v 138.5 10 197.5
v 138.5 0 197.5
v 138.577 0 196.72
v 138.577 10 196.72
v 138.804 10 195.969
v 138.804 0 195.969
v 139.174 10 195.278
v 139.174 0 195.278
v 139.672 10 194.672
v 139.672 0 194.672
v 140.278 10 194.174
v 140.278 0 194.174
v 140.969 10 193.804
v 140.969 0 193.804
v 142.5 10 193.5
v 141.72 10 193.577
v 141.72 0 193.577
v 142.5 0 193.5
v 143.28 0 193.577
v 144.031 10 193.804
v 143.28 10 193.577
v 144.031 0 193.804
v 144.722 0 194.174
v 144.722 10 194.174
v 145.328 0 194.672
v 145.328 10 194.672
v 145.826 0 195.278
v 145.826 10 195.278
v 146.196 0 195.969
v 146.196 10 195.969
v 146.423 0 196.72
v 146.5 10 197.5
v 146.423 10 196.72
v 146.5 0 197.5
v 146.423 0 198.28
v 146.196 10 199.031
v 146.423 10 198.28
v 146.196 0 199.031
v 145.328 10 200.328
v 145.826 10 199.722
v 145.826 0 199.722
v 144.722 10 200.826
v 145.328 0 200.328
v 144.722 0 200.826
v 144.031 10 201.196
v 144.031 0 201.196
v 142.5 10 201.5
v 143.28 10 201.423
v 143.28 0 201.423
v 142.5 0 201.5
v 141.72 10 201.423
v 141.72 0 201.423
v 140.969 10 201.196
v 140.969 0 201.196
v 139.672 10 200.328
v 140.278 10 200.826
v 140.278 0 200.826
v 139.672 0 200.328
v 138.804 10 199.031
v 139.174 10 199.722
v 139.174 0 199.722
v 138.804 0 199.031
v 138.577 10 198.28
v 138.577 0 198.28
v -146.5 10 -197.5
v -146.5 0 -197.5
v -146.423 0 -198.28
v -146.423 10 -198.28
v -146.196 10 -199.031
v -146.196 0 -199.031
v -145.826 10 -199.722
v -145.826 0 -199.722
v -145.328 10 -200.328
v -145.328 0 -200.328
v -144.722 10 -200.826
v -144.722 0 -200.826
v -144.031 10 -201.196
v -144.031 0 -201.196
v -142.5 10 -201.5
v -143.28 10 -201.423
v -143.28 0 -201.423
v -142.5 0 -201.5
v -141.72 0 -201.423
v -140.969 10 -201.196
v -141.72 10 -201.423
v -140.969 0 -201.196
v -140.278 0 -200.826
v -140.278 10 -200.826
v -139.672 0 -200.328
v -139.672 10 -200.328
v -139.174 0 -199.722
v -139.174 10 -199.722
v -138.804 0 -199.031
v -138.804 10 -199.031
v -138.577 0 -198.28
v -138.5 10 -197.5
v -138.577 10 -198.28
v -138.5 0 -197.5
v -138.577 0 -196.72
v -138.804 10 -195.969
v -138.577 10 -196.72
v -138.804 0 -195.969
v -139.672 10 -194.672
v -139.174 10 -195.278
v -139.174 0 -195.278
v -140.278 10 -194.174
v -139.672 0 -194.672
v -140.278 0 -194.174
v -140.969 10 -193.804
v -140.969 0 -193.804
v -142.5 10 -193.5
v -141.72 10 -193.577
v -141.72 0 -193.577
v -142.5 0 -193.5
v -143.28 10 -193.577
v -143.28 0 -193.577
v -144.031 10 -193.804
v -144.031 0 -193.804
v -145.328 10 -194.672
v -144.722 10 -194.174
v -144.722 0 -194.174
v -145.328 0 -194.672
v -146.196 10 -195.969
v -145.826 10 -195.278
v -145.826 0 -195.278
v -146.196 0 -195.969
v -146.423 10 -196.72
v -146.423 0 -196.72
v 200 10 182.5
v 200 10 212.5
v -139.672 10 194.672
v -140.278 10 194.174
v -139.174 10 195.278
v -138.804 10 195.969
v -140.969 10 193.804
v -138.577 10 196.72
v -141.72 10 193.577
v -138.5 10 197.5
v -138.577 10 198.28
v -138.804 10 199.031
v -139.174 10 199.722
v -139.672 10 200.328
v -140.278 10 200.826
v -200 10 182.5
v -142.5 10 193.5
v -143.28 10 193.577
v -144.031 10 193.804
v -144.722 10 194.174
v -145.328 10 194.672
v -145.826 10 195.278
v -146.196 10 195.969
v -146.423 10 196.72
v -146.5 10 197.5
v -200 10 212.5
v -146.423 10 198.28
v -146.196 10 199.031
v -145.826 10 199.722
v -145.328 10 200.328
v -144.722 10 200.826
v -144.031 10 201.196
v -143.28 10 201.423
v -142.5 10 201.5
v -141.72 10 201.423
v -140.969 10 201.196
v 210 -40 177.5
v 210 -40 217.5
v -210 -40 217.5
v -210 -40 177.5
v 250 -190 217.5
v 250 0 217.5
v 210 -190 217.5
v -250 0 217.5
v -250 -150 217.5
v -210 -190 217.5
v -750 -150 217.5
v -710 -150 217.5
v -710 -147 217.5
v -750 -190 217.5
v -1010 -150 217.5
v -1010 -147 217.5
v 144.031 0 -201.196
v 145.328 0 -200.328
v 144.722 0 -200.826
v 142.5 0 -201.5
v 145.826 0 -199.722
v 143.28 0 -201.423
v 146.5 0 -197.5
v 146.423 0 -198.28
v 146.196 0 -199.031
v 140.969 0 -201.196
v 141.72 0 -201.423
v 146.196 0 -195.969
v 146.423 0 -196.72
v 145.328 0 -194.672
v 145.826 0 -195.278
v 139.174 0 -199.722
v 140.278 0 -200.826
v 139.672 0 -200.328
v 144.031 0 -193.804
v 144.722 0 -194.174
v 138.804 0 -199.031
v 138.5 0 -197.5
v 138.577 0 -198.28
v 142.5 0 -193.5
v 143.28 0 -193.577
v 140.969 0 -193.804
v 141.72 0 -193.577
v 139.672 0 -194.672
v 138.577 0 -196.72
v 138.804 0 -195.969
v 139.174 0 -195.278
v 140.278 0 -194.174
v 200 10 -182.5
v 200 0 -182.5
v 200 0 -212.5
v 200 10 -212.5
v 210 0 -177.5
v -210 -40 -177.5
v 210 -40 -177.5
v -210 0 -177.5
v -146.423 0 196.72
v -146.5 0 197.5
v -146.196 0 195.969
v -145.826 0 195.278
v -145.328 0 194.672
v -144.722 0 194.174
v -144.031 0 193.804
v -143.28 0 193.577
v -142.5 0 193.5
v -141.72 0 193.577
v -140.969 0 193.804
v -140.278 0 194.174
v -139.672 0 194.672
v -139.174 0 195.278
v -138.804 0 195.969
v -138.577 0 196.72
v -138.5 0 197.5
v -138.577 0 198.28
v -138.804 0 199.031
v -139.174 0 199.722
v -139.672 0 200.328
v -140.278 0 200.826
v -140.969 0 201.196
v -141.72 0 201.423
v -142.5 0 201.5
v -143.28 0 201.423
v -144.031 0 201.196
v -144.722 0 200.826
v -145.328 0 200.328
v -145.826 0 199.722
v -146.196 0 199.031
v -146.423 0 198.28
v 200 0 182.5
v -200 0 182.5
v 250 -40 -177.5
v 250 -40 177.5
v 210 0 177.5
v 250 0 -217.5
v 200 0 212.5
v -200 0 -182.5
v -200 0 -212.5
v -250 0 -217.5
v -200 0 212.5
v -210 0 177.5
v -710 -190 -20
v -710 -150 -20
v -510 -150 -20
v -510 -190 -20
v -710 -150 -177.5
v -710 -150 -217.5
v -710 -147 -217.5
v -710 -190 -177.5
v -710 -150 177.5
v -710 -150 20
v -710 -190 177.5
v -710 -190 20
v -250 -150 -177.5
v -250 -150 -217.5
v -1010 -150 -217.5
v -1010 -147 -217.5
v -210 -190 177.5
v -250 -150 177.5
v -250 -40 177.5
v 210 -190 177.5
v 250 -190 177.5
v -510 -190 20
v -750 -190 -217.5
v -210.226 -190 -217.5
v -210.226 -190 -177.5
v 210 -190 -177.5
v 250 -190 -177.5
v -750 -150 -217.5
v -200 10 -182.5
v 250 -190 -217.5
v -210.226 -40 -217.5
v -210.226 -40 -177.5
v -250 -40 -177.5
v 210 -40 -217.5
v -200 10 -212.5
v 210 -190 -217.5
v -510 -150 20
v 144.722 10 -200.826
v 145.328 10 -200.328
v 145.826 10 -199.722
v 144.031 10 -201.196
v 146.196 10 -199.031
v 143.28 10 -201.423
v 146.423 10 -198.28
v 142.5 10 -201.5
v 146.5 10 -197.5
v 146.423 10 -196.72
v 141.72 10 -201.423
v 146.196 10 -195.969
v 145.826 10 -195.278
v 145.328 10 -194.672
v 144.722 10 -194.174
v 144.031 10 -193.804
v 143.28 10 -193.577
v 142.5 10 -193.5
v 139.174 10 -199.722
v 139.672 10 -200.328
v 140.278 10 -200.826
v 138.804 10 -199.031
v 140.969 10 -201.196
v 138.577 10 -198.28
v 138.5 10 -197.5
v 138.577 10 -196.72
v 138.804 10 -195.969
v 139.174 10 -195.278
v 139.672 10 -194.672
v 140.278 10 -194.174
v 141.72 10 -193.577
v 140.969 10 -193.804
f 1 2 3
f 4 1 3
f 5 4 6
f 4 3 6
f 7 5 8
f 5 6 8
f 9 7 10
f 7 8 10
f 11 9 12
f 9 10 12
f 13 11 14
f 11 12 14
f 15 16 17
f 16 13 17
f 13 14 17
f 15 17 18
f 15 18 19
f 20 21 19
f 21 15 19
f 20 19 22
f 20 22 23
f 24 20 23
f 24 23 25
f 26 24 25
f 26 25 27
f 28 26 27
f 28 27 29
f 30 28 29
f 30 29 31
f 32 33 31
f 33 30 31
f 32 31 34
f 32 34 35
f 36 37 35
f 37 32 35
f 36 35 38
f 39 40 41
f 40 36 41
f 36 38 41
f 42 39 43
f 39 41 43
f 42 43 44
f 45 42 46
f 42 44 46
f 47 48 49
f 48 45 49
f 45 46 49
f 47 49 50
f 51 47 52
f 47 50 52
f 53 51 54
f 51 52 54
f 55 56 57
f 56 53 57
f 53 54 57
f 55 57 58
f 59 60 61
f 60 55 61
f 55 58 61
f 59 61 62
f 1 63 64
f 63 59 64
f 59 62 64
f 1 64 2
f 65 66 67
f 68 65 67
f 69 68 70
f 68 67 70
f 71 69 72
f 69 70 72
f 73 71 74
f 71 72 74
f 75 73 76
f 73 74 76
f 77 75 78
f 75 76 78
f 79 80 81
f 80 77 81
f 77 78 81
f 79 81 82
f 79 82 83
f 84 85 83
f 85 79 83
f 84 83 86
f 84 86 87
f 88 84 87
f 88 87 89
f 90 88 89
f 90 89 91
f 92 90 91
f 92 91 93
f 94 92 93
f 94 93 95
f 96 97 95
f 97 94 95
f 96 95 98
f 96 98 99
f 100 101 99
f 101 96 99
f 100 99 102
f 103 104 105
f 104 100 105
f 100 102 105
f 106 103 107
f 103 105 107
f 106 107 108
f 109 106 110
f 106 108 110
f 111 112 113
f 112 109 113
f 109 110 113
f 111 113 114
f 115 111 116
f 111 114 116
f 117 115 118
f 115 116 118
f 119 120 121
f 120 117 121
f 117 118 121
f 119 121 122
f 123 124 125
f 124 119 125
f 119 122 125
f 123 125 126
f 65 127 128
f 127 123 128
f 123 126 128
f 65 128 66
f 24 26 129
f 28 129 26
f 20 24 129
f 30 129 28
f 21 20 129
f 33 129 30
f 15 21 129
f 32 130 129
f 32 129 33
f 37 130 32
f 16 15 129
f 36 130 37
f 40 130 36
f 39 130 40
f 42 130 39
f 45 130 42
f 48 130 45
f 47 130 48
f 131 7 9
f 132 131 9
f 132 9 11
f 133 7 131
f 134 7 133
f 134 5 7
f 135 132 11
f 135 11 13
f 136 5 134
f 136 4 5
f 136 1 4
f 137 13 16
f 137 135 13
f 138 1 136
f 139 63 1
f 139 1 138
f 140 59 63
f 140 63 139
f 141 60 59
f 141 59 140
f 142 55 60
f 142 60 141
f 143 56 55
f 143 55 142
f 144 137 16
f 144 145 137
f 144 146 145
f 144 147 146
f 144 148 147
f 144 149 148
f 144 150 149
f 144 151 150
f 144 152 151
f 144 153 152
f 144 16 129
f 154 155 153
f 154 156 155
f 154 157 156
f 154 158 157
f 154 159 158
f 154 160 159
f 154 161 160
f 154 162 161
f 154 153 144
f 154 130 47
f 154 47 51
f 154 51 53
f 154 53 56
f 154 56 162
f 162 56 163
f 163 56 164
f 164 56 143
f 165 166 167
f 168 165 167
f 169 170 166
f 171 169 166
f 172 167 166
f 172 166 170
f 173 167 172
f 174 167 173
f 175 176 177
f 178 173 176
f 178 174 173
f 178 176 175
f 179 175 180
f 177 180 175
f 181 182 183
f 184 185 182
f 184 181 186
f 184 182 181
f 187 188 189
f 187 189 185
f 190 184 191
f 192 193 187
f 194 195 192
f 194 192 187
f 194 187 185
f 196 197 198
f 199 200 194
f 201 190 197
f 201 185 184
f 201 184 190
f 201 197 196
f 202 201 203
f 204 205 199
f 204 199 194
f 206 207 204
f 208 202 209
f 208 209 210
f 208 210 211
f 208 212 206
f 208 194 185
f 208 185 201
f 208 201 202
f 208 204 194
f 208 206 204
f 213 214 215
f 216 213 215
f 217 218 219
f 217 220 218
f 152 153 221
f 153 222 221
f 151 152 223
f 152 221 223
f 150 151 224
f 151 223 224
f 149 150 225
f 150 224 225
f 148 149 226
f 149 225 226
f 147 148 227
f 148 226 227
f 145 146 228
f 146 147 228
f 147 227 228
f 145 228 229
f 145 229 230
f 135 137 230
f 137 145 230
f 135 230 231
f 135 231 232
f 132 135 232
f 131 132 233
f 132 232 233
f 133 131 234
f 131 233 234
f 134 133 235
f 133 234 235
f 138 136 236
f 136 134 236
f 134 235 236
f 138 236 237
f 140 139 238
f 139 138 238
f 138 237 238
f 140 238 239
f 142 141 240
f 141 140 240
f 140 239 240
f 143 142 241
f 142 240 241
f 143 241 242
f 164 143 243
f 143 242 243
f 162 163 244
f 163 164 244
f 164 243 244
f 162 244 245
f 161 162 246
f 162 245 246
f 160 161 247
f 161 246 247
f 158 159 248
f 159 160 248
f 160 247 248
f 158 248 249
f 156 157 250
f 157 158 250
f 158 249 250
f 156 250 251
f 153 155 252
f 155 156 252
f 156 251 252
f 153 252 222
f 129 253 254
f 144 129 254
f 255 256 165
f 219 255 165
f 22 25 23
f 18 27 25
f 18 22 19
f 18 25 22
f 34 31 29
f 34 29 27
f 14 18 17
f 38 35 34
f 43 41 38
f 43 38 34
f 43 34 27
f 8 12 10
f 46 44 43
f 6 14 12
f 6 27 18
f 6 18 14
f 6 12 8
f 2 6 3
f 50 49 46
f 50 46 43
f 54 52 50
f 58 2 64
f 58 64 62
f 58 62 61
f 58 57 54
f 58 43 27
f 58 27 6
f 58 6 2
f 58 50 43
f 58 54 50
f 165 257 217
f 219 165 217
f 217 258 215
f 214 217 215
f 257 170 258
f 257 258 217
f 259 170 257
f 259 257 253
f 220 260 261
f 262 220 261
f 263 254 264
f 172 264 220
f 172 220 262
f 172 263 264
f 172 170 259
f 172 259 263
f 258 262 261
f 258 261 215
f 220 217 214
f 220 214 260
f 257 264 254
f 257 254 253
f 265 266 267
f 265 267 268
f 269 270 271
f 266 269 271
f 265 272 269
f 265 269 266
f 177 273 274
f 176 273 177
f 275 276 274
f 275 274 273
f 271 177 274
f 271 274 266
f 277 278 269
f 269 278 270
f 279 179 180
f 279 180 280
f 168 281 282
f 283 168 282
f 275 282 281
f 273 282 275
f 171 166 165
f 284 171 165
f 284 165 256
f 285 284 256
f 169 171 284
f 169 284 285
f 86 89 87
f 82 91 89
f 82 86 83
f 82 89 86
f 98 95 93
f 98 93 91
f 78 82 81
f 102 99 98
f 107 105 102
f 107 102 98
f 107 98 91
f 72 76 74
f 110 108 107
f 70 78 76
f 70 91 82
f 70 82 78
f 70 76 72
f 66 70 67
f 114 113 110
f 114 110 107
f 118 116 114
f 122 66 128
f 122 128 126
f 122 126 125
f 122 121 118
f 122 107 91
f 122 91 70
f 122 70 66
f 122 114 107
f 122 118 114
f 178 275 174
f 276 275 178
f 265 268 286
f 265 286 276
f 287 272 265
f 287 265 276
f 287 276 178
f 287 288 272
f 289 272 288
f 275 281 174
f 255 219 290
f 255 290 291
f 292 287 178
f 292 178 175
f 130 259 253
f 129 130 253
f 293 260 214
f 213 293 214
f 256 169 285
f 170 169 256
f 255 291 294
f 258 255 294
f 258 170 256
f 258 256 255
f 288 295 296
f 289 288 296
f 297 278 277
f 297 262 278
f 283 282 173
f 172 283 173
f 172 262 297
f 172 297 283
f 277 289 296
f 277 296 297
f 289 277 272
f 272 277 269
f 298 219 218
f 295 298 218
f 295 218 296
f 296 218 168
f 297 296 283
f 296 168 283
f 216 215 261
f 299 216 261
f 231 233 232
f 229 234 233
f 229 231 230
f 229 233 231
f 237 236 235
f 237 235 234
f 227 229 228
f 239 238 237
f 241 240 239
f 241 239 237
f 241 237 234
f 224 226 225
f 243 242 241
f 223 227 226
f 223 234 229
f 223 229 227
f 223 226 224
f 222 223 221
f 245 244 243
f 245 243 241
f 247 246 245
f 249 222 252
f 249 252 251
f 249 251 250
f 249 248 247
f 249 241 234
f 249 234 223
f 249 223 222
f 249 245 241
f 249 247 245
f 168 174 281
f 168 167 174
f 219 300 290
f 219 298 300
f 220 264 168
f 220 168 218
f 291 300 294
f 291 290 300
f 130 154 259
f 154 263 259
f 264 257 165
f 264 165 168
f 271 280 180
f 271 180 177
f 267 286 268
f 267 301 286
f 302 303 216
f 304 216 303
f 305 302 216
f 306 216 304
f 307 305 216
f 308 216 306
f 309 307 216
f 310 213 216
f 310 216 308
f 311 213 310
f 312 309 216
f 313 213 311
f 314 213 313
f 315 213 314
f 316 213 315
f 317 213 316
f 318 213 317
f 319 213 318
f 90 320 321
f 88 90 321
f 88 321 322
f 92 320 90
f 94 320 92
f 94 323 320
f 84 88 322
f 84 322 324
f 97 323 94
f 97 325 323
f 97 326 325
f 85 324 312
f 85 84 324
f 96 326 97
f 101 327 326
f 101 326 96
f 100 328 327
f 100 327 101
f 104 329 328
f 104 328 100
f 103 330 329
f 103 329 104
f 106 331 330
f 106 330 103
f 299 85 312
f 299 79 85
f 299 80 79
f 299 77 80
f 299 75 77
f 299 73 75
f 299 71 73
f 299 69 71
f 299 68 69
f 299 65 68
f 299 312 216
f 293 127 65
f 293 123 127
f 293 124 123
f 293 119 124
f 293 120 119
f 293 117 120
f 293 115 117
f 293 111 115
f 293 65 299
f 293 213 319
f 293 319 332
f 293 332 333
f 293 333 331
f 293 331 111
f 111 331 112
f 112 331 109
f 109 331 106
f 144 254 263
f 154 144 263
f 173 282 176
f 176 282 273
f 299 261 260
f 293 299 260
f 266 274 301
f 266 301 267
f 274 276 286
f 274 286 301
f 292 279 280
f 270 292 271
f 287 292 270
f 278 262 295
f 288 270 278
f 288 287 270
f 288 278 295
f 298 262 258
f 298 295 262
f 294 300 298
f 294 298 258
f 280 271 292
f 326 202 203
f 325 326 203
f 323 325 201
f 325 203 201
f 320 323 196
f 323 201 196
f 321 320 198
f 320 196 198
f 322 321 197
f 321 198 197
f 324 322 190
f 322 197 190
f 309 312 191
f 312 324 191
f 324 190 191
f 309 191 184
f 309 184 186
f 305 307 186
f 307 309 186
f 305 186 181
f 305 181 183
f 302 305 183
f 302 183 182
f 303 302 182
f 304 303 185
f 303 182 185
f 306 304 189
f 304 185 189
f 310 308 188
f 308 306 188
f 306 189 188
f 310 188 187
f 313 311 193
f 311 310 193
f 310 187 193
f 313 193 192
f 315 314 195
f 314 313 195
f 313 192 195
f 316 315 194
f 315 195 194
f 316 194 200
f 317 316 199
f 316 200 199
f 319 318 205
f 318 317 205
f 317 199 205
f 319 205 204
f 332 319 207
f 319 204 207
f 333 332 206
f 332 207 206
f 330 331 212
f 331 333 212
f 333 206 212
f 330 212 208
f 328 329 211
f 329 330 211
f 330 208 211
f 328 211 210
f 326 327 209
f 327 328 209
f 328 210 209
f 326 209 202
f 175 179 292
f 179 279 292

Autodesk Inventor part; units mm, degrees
ref_plane "YZ Plane" through (0, 0, 0) normal (1, 0, 0) x (0, 1, 0)
ref_plane "XZ Plane" through (0, 0, 0) normal (0, 1, 0) x (-1, 0, 0)
ref_plane "XY Plane" through (0, 0, 0) normal (0, 0, 1) x (1, 0, 0)
sketch "Sketch1" plane through (0, 0, 0) normal (0, 1, 0) x (-1, 0, 0)
  line L0 (142.5, 197.5) -> (-142.5, 197.5) construction
  line L1 (-142.5, 197.5) -> (-142.5, -197.5) construction
  line L2 (-142.5, -197.5) -> (142.5, -197.5) construction
  line L3 (142.5, -197.5) -> (142.5, 197.5) construction
  line L4 (142.5, 197.5) -> (-142.5, -197.5) construction
  line L5 (-142.5, 197.5) -> (142.5, -197.5) construction
  line L6 (275, -235) -> (-275, -235) construction
  line L7 (-275, -235) -> (-275, 235) construction
  line L8 (-275, 235) -> (275, 235) construction
  line L9 (275, 235) -> (275, -235) construction
  line L10 (275, -235) -> (-275, 235) construction
  line L11 (-275, -235) -> (275, 235) construction
  line L12 (274.0052, -241.4689) -> (274.0052, -478.1407) construction
  line L13 (274.0052, -478.1407) -> (222.5538, -478.1407) construction
  line L14 (222.5538, -478.1407) -> (222.5538, -241.4689) construction
  line L15 (222.5538, -241.4689) -> (274.0052, -241.4689) construction
  line L16 (200, 212.5) -> (-200, 212.5)
  line L17 (-200, 212.5) -> (-200, 182.5)
  line L18 (-200, 182.5) -> (200, 182.5)
  line L19 (200, 182.5) -> (200, 212.5)
  line L20 (200, 212.5) -> (-200, 182.5) construction
  line L21 (-200, 212.5) -> (200, 182.5) construction
  line L22 (200, -182.5) -> (-200, -182.5)
  line L23 (-200, -182.5) -> (-200, -212.5)
  line L24 (-200, -212.5) -> (200, -212.5)
  line L25 (200, -212.5) -> (200, -182.5)
  line L26 (200, -182.5) -> (-200, -212.5) construction
  line L27 (-200, -182.5) -> (200, -212.5) construction
  circle A0 centre (142.5, 197.5) radius 4
  circle A1 centre (142.5, -197.5) radius 4
  circle A2 centre (-142.5, 197.5) radius 4
  circle A3 centre (-142.5, -197.5) radius 4
  point P0 (0, 0)
  point P1 (0, 197.5)
  point P2 (0, -197.5)
  dimension "d0" = 285
  dimension "d1" = 395
  dimension "d2" = 550
  dimension "d3" = 470
  dimension "d10" = 400
  dimension "d11" = 30
  dimension "d12" = 400
  dimension "d13" = 30
  dimension "d14" = 8
  dimension "d15" = 8
  dimension "d16" = 8
  dimension "d17" = 8
sketch "Sketch2" plane through (0, 0, 0) normal (0, 1, 0) x (-1, 0, 0)
  line L0 (142.5, 197.5) -> (-142.5, 197.5) construction
  line L1 (142.5, -197.5) -> (142.5, 197.5) construction
  line L2 (-142.5, -197.5) -> (142.5, -197.5) construction
  line L3 (-142.5, 197.5) -> (-142.5, -197.5) construction
  line L4 (250, 217.5) -> (-250, 217.5)
  line L5 (-250, 217.5) -> (-250, 177.5)
  line L6 (-250, 177.5) -> (250, 177.5)
  line L7 (250, 177.5) -> (250, 217.5)
  line L8 (250, 217.5) -> (-250, 177.5) construction
  line L9 (-250, 217.5) -> (250, 177.5) construction
  line L10 (250, -177.5) -> (-250, -177.5)
  line L11 (-250, -177.5) -> (-250, -217.5)
  line L12 (-250, -217.5) -> (250, -217.5)
  line L13 (250, -217.5) -> (250, -177.5)
  line L14 (250, -177.5) -> (-250, -217.5) construction
  line L15 (-250, -177.5) -> (250, -217.5) construction
  line L16 (250, 217.5) -> (210, 217.5)
  line L17 (210, 217.5) -> (210, -217.5)
  line L18 (210, -217.5) -> (250, -217.5)
  line L19 (250, -217.5) -> (250, 217.5)
  line L20 (-250, 217.5) -> (-210, 217.5)
  line L21 (-210, 217.5) -> (-210, -217.5)
  line L22 (-210, -217.5) -> (-250, -217.5)
  line L23 (-250, -217.5) -> (-250, 217.5)
  point P0 (0, 0)
  point P1 (0, 197.5)
  point P2 (0, -197.5)
  point P3 (210, -177.5)
  point P4 (-210, -177.5)
  point P5 (-210, 177.5)
  point P6 (210, 177.5)
  dimension "d4" = 500
  dimension "d5" = 40
  dimension "d6" = 500
  dimension "d7" = 40
  dimension "d8" = 40
  dimension "d9" = 40
extrude "Extrusion1" add sketch "Sketch2" against normal blind 40 contours L7 L6 L17 L4 | L17 L6 L21 L4 | L19 L10 L17 L6 | L21 L6 L5 L4 | L13 L12 L17 L10 | L21 L10 L23 L6 | L17 L12 L21 L10 | L21 L12 L11 L10
extrude "Extrusion2" add sketch "Sketch1" along normal blind 10
sketch "Sketch3" plane through (0, -40, 0) normal (0, -1, 0) x (1, 0, 0)
  line L0 (250, -217.5) -> (250, 217.5) construction
  line L1 (250, 217.5) -> (-250, 217.5) construction
  line L2 (-250, -217.5) -> (250, -217.5) construction
  line L3 (-250, 217.5) -> (-250, -217.5) construction
  line L4 (250, 217.5) -> (250, -217.5) projected
  line L5 (210, 177.5) -> (210, -177.5) projected
  line L6 (250, 217.5) -> (210, 217.5)
  line L7 (210, 217.5) -> (210, 177.5)
  line L8 (210, 177.5) -> (250, 177.5)
  line L9 (250, 177.5) -> (250, 217.5)
  line L10 (250, -217.5) -> (-250, -217.5) projected
  line L11 (210, -177.5) -> (250, -177.5)
  line L12 (250, -177.5) -> (250, -217.5)
  line L13 (250, -217.5) -> (210, -217.5)
  line L14 (210, -217.5) -> (210, -177.5)
  line L15 (-250, -217.5) -> (-210.2265, -217.5)
  line L16 (-210.2265, -217.5) -> (-210.2265, -177.5)
  line L17 (-210.2265, -177.5) -> (-250, -177.5)
  line L18 (-250, -177.5) -> (-250, -217.5)
  line L19 (-210, 177.5) -> (-210, -177.5) projected
  line L20 (-250, -217.5) -> (-250, 217.5) projected
  line L21 (-210, 177.5) -> (-250, 177.5)
  line L22 (-250, 177.5) -> (-250, 217.5)
  line L23 (-250, 217.5) -> (-210, 217.5)
  line L24 (-210, 217.5) -> (-210, 177.5)
  point P0 (0, 0)
extrude "Extrusion3" add sketch "Sketch3" along normal blind 150 contours L20 L23 L24 L21 | L10 L18 L17 L16 | L4 L8 L7 L6 | L4 L10 L14 L11
sketch "Sketch4" plane through (-250, 0, -217.5) normal (-1, 0, 0) x (0, 0, 1)
  line L0 (0, 0) -> (435, 0) construction
  line L1 (0, 0) -> (0, -190) construction
  line L2 (40, -190) -> (0, -190) construction
  line L3 (40, -40) -> (40, -190) construction
  line L4 (395, -40) -> (40, -40) construction
  line L5 (395, -40) -> (395, -190) construction
  line L6 (435, -190) -> (395, -190) construction
  line L7 (435, 0) -> (435, -190) construction
  line L8 (0, -40) -> (0, -190) projected
  line L9 (40, -40) -> (40, -190) projected
  line L10 (0, -190) -> (40, -190)
  line L11 (40, -190) -> (40, -150)
  line L12 (40, -150) -> (0, -150)
  line L13 (0, -150) -> (0, -190)
  line L14 (395, -40) -> (395, -190) projected
  line L15 (435, 0) -> (435, -190) projected
  line L16 (395, -190) -> (435, -190)
  line L17 (435, -190) -> (435, -150)
  line L18 (435, -150) -> (395, -150)
  line L19 (395, -150) -> (395, -190)
  point P0 (217.5, 0)
  dimension "d24" = 40
  dimension "d25" = 40
extrude "Extrusion4" add sketch "Sketch4" along normal blind 500
sketch "Sketch5" plane through (-250, -40, -177.5) normal (0, 0, 1) x (1, 0, 0)
  line L0 (0, 0) -> (39.7735, 0) construction
  line L1 (0, 0) -> (0, -110) construction
  line L2 (0, -110) -> (-500, -110) construction
  line L3 (-500, -150) -> (-500, -110) construction
  line L4 (39.7735, -150) -> (-500, -150) construction
  line L5 (39.7735, 0) -> (39.7735, -150) construction
  line L6 (0, -110) -> (-500, -110) projected
  line L7 (-500, -110) -> (-460, -110)
  line L8 (-460, -110) -> (-460, -150)
  line L9 (-460, -150) -> (-500, -150)
  line L10 (-500, -150) -> (-500, -110)
  point P0 (250, 40)
  dimension "d28" = 40
  dimension "d29" = 40
extrude "Extrusion5" add sketch "Sketch5" along normal up to surface (355 mm away)
sketch "Sketch6" plane through (-250, -150, 217.5) normal (0, 1, 0) x (1, 0, 0)
  line L0 (0, 40) -> (0, 0) construction
  line L1 (0, 40) -> (-460, 40) construction
  line L2 (-460, 395) -> (-460, 40) construction
  line L3 (0, 395) -> (-460, 395) construction
  line L4 (0, 435) -> (0, 395) construction
  line L5 (0, 435) -> (-500, 435) construction
  line L6 (-500, 0) -> (-500, 435) construction
  line L7 (0, 0) -> (-500, 0) construction
  line L8 (-460, 0) -> (-760, 0)
  line L9 (-760, 0) -> (-760, 435)
  line L10 (-760, 435) -> (-460, 435)
  line L11 (-460, 435) -> (-460, 0)
  point P0 (250, 217.5)
  dimension "d32" = 300
extrude "Extrusion6" add sketch "Sketch6" along normal blind 3
sketch "Sketch7" plane through (-710, -190, -177.5) normal (1, 0, 0) x (0, 0, -1)
  line L0 (-355, 0) -> (-355, 40) construction
  line L1 (0, 0) -> (-355, 0) construction
  line L2 (0, 40) -> (0, 0) construction
  line L3 (40, 40) -> (0, 40) construction
  line L4 (40, 40) -> (40, 43) construction
  line L5 (-395, 43) -> (40, 43) construction
  line L6 (-395, 40) -> (-395, 43) construction
  line L7 (-355, 40) -> (-395, 40) construction
  line L8 (-197.5, 40) -> (-157.5, 40)
  line L9 (-157.5, 40) -> (-157.5, 0)
  line L10 (-157.5, 0) -> (-197.5, 0)
  line L11 (-197.5, 0) -> (-197.5, 40)
  line L12 (-197.5, 40) -> (-157.5, 0) construction
  line L13 (-157.5, 40) -> (-197.5, 0) construction
  point P0 (-177.5, 190)
  point P1 (-177.5, 20)
  dimension "d35" = 40
  dimension "d36" = 40
extrude "Extrusion7" add sketch "Sketch7" along normal blind 200
properties part number "test1"
